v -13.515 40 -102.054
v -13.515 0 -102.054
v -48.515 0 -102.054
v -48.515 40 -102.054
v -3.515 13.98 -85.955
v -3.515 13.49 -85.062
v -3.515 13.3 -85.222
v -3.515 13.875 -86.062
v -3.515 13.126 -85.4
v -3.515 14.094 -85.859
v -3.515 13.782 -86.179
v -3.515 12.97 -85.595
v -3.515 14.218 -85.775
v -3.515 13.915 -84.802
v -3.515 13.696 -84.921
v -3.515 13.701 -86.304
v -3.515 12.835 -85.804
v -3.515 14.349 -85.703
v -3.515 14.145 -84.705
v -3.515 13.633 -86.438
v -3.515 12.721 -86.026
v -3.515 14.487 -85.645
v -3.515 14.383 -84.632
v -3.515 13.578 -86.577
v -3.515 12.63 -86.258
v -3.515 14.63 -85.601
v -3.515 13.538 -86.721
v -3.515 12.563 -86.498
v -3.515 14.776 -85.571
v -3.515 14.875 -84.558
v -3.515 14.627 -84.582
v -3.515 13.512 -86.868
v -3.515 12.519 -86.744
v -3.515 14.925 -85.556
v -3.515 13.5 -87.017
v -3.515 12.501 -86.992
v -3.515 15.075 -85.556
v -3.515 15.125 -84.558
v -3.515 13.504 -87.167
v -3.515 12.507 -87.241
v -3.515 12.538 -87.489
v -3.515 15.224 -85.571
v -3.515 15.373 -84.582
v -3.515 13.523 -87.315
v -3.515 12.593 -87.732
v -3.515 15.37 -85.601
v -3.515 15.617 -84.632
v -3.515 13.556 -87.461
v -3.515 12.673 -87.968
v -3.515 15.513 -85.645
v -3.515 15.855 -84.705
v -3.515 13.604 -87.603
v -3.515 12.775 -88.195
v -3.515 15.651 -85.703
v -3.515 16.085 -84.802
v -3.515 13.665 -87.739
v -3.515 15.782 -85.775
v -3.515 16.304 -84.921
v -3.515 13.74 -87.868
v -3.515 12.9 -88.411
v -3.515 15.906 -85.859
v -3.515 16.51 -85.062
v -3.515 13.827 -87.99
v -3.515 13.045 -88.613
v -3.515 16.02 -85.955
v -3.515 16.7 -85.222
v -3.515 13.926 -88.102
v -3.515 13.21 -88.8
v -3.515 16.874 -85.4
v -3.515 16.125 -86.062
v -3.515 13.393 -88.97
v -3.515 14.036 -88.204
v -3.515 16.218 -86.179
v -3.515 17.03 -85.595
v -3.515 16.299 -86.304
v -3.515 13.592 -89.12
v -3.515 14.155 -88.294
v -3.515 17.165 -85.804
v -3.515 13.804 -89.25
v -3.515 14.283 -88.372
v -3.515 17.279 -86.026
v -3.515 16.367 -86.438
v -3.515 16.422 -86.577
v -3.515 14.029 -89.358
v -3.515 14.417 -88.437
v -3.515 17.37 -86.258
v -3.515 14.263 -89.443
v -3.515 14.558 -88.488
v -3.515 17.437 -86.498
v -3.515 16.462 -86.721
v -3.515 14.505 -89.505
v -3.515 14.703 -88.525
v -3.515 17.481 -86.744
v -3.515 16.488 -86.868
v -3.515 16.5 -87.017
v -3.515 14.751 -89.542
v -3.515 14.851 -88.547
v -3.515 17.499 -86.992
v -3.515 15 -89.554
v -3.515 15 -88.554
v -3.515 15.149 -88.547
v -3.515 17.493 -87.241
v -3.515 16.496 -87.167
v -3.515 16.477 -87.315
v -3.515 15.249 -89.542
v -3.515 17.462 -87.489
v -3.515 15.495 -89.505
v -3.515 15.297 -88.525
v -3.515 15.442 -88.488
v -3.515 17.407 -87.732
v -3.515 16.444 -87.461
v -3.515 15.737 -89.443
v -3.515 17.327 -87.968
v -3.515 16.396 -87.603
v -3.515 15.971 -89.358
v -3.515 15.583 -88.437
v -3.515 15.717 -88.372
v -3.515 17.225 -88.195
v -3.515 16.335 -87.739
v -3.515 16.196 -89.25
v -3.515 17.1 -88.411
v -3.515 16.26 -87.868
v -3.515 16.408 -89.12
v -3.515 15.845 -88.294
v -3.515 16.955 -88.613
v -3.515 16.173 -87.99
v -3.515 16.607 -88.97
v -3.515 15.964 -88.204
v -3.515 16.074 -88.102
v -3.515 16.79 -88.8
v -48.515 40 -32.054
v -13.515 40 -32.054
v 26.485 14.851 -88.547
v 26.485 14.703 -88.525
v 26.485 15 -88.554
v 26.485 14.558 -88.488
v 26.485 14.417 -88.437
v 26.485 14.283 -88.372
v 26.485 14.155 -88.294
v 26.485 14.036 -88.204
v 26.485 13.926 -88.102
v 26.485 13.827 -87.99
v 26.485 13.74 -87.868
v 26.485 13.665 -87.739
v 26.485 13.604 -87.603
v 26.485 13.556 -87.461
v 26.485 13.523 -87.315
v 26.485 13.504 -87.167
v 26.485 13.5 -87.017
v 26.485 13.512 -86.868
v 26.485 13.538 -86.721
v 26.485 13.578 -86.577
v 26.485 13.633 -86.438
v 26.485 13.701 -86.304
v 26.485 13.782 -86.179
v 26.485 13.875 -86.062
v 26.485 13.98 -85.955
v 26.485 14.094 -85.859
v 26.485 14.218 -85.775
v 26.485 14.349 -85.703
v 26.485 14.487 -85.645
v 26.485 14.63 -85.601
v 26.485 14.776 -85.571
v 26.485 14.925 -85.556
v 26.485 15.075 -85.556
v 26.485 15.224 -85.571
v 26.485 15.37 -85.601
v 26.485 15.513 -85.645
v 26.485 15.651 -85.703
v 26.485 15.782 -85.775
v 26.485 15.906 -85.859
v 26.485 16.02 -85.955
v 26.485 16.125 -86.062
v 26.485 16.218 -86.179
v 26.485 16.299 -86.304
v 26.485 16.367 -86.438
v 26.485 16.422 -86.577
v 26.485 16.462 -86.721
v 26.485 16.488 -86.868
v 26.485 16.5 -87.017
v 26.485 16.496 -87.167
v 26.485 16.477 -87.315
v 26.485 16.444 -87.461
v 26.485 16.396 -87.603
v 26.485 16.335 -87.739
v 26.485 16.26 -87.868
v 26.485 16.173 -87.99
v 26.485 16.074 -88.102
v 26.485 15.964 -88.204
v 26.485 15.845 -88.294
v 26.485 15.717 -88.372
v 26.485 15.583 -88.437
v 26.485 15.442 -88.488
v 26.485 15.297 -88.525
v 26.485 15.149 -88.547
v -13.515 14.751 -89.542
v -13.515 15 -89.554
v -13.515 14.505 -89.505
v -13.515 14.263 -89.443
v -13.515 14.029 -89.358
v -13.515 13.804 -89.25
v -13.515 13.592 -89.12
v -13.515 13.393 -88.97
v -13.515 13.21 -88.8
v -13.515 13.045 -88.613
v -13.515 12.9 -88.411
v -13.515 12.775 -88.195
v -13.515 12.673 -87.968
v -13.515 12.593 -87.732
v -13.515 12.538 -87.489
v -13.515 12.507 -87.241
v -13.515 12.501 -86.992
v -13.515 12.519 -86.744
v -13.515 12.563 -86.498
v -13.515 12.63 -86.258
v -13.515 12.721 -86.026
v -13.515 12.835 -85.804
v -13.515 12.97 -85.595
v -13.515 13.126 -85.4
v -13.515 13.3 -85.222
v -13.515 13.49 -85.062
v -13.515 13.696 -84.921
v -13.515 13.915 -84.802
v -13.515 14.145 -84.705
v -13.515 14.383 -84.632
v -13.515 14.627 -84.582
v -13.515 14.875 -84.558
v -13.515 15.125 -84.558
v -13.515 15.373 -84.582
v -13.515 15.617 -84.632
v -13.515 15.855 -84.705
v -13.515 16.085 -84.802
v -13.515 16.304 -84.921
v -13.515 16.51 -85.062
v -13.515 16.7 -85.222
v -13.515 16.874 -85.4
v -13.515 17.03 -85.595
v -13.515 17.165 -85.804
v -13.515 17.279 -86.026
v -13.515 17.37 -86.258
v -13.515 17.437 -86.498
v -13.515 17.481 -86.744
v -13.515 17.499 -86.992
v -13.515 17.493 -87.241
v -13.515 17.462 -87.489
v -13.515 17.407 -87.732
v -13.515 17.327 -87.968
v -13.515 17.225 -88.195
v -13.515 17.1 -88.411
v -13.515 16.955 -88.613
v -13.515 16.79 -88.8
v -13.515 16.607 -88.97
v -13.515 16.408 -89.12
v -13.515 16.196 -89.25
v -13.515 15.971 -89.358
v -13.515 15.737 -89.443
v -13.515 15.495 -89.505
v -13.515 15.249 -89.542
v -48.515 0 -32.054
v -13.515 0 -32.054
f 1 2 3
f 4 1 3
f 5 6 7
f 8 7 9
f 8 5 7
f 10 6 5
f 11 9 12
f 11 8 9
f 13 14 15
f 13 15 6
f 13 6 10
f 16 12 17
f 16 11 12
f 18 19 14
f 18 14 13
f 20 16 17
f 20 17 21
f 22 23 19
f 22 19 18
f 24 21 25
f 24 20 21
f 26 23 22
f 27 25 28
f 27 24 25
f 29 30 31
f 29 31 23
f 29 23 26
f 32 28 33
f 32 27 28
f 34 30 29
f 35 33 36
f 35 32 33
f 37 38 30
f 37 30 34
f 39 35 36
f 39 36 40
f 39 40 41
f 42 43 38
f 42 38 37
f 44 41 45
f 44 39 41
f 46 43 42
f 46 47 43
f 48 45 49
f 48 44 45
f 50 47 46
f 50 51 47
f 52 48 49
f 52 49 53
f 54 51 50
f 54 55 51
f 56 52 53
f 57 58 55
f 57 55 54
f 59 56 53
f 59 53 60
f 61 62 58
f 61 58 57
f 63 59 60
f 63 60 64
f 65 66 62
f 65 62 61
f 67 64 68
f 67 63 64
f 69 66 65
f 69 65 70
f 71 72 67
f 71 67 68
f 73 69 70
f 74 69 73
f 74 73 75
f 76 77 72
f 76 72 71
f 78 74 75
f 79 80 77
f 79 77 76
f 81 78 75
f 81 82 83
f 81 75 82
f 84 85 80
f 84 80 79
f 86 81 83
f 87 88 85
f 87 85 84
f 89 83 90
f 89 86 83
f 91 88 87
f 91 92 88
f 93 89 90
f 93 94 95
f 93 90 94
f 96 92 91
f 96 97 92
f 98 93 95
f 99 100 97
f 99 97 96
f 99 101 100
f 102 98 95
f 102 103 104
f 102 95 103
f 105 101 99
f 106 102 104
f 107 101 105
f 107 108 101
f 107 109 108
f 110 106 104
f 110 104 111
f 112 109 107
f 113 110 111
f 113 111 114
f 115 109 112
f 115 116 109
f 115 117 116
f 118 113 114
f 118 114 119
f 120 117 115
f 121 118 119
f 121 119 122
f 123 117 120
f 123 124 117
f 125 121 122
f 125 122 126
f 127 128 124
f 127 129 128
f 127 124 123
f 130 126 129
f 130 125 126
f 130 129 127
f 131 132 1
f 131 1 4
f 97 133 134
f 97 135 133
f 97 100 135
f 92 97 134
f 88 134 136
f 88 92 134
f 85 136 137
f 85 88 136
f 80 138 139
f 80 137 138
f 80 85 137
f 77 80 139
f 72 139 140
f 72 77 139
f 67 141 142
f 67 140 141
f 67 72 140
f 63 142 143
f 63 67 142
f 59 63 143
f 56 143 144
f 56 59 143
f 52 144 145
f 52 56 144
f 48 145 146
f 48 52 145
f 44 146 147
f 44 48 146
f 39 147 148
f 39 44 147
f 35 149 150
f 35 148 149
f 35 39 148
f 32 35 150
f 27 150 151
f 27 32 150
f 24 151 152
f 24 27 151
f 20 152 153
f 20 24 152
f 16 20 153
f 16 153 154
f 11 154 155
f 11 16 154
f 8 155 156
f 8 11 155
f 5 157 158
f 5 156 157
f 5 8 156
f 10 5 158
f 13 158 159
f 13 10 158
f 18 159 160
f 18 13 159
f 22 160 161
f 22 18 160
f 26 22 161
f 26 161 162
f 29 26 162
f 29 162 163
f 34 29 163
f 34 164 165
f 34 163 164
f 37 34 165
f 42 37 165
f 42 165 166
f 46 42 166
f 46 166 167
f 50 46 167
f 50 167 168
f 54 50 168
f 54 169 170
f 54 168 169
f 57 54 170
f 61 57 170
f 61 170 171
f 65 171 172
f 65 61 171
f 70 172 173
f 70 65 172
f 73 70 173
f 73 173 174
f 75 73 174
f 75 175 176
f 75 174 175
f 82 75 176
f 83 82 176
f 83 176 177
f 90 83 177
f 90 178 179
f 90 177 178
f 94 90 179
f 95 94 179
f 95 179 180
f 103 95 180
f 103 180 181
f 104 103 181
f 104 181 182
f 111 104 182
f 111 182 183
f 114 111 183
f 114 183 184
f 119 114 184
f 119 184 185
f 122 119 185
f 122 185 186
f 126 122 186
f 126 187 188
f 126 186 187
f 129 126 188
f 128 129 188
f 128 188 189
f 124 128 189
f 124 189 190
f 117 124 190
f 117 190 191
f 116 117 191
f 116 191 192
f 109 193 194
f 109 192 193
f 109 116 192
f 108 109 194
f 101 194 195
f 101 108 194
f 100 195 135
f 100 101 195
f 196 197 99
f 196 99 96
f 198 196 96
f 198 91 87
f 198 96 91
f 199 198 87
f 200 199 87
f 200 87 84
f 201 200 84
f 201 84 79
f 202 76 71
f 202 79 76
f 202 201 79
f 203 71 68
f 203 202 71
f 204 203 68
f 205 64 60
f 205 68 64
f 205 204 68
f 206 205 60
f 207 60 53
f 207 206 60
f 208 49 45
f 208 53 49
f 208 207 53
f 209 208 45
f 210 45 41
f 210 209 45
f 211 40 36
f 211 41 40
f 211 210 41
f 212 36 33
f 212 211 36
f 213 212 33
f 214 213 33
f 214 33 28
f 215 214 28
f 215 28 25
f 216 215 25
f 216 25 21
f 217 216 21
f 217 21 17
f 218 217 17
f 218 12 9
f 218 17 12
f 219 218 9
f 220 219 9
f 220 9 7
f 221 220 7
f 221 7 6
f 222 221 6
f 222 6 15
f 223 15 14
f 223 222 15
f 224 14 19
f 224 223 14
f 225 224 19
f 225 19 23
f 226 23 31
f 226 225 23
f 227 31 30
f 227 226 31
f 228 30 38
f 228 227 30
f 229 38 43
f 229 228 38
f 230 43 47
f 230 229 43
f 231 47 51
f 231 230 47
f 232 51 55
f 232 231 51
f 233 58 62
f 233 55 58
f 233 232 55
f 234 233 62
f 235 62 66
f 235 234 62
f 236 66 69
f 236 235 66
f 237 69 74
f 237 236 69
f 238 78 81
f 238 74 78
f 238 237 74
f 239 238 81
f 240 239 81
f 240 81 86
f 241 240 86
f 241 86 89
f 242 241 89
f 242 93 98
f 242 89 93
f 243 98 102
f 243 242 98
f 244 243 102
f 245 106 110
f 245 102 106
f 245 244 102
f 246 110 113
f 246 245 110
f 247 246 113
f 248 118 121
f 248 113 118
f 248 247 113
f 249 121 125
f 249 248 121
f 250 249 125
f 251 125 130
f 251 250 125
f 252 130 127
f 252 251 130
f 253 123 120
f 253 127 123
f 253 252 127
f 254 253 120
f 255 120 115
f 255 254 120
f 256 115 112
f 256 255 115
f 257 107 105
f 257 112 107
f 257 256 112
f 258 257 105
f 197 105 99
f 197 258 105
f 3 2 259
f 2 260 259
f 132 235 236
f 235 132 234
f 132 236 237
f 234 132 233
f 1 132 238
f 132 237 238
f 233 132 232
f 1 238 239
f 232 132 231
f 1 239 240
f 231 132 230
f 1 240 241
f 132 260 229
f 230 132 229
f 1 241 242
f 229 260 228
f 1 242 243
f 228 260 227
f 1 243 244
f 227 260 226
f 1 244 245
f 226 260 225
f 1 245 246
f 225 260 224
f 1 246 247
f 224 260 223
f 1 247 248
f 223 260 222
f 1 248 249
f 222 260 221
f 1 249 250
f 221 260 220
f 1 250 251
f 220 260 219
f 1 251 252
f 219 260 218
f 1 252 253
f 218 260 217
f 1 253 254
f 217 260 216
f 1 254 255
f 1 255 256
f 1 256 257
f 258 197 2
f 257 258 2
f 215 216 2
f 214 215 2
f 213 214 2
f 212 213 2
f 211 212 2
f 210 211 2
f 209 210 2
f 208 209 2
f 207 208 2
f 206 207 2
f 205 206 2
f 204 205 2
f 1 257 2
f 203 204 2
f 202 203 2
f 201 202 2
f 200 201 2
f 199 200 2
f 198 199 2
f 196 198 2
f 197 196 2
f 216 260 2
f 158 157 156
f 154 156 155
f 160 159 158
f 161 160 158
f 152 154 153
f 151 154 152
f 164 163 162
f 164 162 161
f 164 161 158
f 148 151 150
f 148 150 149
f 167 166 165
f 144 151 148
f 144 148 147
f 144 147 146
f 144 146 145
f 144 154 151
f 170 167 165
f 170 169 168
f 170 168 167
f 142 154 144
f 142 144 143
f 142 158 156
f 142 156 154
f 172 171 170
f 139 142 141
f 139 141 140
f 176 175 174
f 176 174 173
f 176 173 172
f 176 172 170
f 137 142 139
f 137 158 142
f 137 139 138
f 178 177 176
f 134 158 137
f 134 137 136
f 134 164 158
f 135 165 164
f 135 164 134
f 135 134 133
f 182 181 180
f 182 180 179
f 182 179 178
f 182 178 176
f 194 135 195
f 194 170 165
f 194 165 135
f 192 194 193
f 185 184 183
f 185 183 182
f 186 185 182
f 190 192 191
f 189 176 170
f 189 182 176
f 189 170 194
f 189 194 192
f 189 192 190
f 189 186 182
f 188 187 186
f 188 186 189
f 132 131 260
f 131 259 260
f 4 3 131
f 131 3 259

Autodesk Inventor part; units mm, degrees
ref_plane "YZ Plane" through (0, 0, 0) normal (1, 0, 0) x (0, 1, 0)
ref_plane "XZ Plane" through (0, 0, 0) normal (0, 1, 0) x (-1, 0, 0)
ref_plane "XY Plane" through (0, 0, 0) normal (0, 0, 1) x (1, 0, 0)
sketch "Skizze1" plane through (0, 0, 0) normal (0, 1, 0) x (-1, 0, 0)
  line L0 (48.5149, -32.0545) -> (13.5149, -32.0545)
  line L1 (13.5149, -32.0545) -> (13.5149, -102.0545)
  line L2 (13.5149, -102.0545) -> (48.5149, -102.0545)
  line L3 (48.5149, -102.0545) -> (48.5149, -32.0545)
  point P0 (0, 0)
  dimension "d0" = 70
  dimension "d1" = 35
extrude "Extrusion1" add sketch "Skizze1" along normal blind 40
sketch "Skizze2" plane through (-13.5149, 0, -32.0545) normal (1, 0, 0) x (0, 0, -1)
  circle A0 centre (55, 15) radius 1.5
  circle A1 centre (55, 15) radius 2.5
  line L0 (0, 0) -> (70, 0) projected
  line L1 (70, 0) -> (70, 40) projected
  point P0 (-32.0545, 0)
  dimension "d4" = 3
  dimension "d5" = 5
  dimension "d10" = 15
  dimension "d11" = 15
extrude "Extrusion2" add sketch "Skizze2" along normal blind 40 contours A0
extrude "Extrusion3" add sketch "Skizze2" along normal blind 10
properties part number "Motor_rechts"
